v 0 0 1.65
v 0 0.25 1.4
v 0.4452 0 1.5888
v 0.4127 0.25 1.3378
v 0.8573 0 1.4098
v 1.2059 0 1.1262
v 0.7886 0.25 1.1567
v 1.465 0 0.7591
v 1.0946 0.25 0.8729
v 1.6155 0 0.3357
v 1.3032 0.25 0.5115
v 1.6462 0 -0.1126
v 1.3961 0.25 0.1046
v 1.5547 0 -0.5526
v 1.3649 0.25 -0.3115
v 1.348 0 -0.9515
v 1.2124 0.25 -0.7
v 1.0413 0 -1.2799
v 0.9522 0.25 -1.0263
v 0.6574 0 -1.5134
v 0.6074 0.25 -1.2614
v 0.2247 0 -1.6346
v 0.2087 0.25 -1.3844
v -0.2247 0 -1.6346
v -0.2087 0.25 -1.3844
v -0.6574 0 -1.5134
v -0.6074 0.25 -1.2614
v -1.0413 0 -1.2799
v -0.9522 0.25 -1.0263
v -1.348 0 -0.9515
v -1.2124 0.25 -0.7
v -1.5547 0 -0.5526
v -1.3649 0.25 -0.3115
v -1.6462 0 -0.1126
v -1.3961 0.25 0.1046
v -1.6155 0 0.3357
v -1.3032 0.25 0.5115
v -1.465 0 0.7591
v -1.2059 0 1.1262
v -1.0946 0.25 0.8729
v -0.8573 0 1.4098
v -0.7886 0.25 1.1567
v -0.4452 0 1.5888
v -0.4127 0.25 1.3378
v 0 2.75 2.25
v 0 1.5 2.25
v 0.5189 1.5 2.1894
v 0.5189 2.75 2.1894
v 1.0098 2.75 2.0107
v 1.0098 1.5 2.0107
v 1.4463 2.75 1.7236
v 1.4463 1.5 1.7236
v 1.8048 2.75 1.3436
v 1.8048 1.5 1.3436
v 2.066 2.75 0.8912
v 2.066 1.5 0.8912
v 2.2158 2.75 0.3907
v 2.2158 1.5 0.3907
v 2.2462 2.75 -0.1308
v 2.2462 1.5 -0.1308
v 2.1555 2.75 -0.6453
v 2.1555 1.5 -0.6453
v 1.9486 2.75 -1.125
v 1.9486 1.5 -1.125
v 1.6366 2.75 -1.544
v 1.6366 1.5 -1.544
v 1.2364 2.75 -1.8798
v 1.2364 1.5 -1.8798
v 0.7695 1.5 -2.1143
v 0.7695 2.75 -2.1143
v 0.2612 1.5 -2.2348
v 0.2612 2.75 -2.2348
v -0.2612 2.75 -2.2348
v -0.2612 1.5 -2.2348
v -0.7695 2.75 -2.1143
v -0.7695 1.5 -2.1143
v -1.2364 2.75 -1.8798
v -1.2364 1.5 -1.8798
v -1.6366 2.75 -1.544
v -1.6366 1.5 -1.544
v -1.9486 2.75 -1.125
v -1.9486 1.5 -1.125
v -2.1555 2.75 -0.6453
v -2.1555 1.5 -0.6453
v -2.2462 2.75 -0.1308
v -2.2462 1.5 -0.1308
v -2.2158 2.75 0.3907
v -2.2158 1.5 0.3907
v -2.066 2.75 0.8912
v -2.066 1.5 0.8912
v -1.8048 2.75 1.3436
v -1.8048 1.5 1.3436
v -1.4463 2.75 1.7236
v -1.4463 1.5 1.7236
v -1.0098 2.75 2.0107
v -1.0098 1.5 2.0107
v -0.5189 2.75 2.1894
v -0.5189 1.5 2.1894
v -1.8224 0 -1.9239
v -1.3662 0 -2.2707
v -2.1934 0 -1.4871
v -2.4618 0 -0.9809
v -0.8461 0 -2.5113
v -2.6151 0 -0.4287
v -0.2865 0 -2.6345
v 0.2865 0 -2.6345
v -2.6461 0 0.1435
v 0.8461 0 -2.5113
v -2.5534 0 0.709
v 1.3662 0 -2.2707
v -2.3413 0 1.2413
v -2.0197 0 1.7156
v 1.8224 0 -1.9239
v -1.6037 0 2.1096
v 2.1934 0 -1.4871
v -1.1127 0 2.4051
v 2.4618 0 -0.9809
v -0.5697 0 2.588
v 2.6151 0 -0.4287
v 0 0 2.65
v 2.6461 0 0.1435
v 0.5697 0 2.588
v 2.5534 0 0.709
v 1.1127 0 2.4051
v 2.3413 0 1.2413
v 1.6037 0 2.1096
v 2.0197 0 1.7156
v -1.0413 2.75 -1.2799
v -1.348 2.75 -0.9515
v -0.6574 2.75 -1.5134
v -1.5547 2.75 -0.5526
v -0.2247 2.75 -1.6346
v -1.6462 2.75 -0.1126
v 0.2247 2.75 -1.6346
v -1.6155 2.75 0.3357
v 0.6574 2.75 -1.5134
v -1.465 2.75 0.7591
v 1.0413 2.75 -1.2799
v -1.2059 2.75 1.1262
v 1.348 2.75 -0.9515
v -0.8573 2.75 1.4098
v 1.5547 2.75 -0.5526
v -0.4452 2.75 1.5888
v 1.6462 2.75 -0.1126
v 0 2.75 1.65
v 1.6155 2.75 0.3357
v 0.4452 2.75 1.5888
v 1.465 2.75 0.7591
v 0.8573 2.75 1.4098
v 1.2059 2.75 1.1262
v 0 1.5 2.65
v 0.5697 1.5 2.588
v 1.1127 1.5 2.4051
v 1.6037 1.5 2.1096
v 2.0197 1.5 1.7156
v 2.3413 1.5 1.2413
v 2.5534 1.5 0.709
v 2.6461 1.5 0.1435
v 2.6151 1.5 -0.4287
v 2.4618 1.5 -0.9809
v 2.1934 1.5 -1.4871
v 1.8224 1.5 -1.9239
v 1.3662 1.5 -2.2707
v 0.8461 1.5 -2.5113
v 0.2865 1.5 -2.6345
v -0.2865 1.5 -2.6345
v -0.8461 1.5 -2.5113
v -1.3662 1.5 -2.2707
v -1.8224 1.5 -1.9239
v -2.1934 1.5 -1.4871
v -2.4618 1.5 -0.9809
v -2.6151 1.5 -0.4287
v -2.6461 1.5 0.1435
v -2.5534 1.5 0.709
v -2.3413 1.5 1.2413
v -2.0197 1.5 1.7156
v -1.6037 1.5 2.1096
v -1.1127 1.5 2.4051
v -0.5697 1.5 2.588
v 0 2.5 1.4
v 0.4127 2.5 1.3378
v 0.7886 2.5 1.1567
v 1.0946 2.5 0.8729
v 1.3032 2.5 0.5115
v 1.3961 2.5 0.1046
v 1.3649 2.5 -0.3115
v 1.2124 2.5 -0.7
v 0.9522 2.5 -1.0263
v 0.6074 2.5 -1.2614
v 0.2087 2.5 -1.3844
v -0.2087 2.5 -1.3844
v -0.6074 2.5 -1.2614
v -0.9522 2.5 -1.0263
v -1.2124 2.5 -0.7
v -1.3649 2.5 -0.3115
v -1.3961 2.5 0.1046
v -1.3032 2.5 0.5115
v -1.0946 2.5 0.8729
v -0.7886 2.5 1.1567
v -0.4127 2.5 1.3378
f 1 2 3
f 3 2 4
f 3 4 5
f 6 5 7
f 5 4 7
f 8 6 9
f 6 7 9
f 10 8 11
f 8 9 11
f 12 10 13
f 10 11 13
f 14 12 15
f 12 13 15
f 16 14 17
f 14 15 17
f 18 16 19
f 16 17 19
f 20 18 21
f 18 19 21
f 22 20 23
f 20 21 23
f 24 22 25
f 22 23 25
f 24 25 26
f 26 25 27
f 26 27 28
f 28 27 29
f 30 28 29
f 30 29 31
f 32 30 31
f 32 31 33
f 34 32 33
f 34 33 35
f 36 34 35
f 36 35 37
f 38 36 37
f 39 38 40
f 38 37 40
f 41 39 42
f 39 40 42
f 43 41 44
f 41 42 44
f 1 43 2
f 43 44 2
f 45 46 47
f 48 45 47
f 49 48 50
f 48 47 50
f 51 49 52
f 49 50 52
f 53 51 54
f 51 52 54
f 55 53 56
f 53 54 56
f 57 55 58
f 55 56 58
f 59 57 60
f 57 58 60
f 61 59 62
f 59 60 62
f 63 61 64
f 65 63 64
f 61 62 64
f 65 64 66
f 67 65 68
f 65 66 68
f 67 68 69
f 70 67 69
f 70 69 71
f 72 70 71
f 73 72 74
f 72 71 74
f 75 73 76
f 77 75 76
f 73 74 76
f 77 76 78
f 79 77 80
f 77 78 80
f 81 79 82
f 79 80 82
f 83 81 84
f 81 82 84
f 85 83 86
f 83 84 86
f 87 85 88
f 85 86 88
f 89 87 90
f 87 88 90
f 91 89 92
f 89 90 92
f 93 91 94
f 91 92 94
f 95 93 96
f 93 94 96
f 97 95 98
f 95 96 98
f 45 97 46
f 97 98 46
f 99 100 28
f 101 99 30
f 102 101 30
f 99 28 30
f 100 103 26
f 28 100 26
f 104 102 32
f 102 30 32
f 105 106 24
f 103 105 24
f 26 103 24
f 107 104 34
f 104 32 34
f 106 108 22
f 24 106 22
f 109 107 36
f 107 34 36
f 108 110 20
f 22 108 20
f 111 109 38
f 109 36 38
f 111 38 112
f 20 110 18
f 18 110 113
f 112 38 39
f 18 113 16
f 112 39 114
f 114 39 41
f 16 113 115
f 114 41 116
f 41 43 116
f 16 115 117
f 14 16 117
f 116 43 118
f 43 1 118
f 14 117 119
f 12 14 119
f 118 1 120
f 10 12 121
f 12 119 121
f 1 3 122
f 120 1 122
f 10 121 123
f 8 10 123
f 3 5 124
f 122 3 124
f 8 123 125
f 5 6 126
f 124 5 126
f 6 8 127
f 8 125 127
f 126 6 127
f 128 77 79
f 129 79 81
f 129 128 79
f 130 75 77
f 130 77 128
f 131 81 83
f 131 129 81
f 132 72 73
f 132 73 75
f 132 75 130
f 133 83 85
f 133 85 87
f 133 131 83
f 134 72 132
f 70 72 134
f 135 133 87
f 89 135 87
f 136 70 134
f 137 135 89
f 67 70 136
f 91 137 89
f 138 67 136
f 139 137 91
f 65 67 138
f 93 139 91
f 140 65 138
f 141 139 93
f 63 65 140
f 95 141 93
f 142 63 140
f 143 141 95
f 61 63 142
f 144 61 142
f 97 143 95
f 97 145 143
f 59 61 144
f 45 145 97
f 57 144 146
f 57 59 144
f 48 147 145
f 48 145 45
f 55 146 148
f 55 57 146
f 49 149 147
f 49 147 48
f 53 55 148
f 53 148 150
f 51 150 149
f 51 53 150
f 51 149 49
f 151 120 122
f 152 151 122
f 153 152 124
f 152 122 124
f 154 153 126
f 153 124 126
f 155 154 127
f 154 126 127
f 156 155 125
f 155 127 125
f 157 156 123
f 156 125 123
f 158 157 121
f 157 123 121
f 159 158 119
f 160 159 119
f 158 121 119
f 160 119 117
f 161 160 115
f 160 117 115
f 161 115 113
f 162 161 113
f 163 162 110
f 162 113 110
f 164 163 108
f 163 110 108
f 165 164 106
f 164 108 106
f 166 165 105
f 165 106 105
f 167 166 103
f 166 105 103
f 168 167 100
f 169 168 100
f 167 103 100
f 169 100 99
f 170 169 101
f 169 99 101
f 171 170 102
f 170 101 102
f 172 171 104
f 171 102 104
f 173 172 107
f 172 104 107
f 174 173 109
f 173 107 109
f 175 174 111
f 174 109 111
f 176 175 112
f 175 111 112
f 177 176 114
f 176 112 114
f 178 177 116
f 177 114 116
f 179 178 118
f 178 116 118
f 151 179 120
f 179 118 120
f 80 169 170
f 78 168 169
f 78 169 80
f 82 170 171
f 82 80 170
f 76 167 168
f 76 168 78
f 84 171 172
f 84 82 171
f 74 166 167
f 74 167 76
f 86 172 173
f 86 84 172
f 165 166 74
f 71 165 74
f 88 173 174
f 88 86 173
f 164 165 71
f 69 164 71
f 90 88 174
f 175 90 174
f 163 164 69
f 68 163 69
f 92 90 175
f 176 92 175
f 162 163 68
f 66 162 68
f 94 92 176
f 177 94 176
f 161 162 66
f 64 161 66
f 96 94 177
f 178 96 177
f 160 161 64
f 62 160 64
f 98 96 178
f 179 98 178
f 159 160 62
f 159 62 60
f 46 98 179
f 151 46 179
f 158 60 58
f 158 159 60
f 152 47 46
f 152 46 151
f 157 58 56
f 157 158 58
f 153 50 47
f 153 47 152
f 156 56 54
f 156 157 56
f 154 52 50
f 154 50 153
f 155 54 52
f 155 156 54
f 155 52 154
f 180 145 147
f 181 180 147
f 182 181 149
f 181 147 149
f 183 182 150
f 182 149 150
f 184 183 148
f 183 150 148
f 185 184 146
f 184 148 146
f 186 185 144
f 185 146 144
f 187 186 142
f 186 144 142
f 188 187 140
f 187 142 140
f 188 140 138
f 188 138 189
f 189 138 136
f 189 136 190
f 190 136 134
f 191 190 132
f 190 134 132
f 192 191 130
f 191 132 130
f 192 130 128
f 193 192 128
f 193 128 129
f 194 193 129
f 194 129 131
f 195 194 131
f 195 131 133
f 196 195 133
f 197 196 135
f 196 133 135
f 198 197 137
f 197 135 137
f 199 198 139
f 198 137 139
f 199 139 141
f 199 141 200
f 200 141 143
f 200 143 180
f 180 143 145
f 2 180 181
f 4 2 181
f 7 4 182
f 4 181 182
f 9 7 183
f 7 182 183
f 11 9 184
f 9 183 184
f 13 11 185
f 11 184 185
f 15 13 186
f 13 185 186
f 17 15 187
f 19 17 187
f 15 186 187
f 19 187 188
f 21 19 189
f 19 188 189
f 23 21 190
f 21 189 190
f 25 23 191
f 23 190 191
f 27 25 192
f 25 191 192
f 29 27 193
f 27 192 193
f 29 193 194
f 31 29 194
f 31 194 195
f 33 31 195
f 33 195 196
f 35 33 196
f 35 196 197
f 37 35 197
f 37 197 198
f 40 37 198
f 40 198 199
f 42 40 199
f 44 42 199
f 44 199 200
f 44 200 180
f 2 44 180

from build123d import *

# Parameters (mm, degrees)
SKETCH1_R           = 2.65
BOSS_EXTRUDE1_DEPTH = 1.5
SKETCH2_R           = 2.25
BOSS_EXTRUDE2_DEPTH = 1.25
SKETCH3_R           = 1.4
CUT_EXTRUDE1_DEPTH  = 5.648386817
CHAMFER1_SIZE       = 0.25


with BuildPart() as part:
    # Sketch1 → Boss-Extrude1 (new body)
    with BuildSketch(Plane(origin=(0, 0, 0), x_dir=(1, 0, 0), z_dir=(0, 1, 0))):
        with Locations(Location((0, 0, 0), (0, 0, 270))):
            Circle(SKETCH1_R)
    extrude(amount=BOSS_EXTRUDE1_DEPTH)

    # Sketch2 → Boss-Extrude2 (add)
    with BuildSketch(Plane(origin=(0, 1.5, 0), x_dir=(1, 0, 0), z_dir=(0, 1, 0))):
        with Locations(Location((0, 0, 0), (0, 0, 270))):
            Circle(SKETCH2_R)
    extrude(amount=BOSS_EXTRUDE2_DEPTH)

    # Sketch3 → Cut-Extrude1 (cut, through all)
    with BuildSketch(Plane(origin=(0, 2.75, 0), x_dir=(1, 0, 0), z_dir=(0, 1, 0))):
        with Locations(Location((0, 0, 0), (0, 0, 270))):
            Circle(SKETCH3_R)
    extrude(amount=-CUT_EXTRUDE1_DEPTH, mode=Mode.SUBTRACT)

    # Chamfer1
    chamfer1_edges = [part.edges().sort_by_distance(p)[0] for p in [
        (0, 0, -1.4),
        (0, 2.75, -1.4),
    ]]
    chamfer(chamfer1_edges, length=CHAMFER1_SIZE)


solid = part.part
